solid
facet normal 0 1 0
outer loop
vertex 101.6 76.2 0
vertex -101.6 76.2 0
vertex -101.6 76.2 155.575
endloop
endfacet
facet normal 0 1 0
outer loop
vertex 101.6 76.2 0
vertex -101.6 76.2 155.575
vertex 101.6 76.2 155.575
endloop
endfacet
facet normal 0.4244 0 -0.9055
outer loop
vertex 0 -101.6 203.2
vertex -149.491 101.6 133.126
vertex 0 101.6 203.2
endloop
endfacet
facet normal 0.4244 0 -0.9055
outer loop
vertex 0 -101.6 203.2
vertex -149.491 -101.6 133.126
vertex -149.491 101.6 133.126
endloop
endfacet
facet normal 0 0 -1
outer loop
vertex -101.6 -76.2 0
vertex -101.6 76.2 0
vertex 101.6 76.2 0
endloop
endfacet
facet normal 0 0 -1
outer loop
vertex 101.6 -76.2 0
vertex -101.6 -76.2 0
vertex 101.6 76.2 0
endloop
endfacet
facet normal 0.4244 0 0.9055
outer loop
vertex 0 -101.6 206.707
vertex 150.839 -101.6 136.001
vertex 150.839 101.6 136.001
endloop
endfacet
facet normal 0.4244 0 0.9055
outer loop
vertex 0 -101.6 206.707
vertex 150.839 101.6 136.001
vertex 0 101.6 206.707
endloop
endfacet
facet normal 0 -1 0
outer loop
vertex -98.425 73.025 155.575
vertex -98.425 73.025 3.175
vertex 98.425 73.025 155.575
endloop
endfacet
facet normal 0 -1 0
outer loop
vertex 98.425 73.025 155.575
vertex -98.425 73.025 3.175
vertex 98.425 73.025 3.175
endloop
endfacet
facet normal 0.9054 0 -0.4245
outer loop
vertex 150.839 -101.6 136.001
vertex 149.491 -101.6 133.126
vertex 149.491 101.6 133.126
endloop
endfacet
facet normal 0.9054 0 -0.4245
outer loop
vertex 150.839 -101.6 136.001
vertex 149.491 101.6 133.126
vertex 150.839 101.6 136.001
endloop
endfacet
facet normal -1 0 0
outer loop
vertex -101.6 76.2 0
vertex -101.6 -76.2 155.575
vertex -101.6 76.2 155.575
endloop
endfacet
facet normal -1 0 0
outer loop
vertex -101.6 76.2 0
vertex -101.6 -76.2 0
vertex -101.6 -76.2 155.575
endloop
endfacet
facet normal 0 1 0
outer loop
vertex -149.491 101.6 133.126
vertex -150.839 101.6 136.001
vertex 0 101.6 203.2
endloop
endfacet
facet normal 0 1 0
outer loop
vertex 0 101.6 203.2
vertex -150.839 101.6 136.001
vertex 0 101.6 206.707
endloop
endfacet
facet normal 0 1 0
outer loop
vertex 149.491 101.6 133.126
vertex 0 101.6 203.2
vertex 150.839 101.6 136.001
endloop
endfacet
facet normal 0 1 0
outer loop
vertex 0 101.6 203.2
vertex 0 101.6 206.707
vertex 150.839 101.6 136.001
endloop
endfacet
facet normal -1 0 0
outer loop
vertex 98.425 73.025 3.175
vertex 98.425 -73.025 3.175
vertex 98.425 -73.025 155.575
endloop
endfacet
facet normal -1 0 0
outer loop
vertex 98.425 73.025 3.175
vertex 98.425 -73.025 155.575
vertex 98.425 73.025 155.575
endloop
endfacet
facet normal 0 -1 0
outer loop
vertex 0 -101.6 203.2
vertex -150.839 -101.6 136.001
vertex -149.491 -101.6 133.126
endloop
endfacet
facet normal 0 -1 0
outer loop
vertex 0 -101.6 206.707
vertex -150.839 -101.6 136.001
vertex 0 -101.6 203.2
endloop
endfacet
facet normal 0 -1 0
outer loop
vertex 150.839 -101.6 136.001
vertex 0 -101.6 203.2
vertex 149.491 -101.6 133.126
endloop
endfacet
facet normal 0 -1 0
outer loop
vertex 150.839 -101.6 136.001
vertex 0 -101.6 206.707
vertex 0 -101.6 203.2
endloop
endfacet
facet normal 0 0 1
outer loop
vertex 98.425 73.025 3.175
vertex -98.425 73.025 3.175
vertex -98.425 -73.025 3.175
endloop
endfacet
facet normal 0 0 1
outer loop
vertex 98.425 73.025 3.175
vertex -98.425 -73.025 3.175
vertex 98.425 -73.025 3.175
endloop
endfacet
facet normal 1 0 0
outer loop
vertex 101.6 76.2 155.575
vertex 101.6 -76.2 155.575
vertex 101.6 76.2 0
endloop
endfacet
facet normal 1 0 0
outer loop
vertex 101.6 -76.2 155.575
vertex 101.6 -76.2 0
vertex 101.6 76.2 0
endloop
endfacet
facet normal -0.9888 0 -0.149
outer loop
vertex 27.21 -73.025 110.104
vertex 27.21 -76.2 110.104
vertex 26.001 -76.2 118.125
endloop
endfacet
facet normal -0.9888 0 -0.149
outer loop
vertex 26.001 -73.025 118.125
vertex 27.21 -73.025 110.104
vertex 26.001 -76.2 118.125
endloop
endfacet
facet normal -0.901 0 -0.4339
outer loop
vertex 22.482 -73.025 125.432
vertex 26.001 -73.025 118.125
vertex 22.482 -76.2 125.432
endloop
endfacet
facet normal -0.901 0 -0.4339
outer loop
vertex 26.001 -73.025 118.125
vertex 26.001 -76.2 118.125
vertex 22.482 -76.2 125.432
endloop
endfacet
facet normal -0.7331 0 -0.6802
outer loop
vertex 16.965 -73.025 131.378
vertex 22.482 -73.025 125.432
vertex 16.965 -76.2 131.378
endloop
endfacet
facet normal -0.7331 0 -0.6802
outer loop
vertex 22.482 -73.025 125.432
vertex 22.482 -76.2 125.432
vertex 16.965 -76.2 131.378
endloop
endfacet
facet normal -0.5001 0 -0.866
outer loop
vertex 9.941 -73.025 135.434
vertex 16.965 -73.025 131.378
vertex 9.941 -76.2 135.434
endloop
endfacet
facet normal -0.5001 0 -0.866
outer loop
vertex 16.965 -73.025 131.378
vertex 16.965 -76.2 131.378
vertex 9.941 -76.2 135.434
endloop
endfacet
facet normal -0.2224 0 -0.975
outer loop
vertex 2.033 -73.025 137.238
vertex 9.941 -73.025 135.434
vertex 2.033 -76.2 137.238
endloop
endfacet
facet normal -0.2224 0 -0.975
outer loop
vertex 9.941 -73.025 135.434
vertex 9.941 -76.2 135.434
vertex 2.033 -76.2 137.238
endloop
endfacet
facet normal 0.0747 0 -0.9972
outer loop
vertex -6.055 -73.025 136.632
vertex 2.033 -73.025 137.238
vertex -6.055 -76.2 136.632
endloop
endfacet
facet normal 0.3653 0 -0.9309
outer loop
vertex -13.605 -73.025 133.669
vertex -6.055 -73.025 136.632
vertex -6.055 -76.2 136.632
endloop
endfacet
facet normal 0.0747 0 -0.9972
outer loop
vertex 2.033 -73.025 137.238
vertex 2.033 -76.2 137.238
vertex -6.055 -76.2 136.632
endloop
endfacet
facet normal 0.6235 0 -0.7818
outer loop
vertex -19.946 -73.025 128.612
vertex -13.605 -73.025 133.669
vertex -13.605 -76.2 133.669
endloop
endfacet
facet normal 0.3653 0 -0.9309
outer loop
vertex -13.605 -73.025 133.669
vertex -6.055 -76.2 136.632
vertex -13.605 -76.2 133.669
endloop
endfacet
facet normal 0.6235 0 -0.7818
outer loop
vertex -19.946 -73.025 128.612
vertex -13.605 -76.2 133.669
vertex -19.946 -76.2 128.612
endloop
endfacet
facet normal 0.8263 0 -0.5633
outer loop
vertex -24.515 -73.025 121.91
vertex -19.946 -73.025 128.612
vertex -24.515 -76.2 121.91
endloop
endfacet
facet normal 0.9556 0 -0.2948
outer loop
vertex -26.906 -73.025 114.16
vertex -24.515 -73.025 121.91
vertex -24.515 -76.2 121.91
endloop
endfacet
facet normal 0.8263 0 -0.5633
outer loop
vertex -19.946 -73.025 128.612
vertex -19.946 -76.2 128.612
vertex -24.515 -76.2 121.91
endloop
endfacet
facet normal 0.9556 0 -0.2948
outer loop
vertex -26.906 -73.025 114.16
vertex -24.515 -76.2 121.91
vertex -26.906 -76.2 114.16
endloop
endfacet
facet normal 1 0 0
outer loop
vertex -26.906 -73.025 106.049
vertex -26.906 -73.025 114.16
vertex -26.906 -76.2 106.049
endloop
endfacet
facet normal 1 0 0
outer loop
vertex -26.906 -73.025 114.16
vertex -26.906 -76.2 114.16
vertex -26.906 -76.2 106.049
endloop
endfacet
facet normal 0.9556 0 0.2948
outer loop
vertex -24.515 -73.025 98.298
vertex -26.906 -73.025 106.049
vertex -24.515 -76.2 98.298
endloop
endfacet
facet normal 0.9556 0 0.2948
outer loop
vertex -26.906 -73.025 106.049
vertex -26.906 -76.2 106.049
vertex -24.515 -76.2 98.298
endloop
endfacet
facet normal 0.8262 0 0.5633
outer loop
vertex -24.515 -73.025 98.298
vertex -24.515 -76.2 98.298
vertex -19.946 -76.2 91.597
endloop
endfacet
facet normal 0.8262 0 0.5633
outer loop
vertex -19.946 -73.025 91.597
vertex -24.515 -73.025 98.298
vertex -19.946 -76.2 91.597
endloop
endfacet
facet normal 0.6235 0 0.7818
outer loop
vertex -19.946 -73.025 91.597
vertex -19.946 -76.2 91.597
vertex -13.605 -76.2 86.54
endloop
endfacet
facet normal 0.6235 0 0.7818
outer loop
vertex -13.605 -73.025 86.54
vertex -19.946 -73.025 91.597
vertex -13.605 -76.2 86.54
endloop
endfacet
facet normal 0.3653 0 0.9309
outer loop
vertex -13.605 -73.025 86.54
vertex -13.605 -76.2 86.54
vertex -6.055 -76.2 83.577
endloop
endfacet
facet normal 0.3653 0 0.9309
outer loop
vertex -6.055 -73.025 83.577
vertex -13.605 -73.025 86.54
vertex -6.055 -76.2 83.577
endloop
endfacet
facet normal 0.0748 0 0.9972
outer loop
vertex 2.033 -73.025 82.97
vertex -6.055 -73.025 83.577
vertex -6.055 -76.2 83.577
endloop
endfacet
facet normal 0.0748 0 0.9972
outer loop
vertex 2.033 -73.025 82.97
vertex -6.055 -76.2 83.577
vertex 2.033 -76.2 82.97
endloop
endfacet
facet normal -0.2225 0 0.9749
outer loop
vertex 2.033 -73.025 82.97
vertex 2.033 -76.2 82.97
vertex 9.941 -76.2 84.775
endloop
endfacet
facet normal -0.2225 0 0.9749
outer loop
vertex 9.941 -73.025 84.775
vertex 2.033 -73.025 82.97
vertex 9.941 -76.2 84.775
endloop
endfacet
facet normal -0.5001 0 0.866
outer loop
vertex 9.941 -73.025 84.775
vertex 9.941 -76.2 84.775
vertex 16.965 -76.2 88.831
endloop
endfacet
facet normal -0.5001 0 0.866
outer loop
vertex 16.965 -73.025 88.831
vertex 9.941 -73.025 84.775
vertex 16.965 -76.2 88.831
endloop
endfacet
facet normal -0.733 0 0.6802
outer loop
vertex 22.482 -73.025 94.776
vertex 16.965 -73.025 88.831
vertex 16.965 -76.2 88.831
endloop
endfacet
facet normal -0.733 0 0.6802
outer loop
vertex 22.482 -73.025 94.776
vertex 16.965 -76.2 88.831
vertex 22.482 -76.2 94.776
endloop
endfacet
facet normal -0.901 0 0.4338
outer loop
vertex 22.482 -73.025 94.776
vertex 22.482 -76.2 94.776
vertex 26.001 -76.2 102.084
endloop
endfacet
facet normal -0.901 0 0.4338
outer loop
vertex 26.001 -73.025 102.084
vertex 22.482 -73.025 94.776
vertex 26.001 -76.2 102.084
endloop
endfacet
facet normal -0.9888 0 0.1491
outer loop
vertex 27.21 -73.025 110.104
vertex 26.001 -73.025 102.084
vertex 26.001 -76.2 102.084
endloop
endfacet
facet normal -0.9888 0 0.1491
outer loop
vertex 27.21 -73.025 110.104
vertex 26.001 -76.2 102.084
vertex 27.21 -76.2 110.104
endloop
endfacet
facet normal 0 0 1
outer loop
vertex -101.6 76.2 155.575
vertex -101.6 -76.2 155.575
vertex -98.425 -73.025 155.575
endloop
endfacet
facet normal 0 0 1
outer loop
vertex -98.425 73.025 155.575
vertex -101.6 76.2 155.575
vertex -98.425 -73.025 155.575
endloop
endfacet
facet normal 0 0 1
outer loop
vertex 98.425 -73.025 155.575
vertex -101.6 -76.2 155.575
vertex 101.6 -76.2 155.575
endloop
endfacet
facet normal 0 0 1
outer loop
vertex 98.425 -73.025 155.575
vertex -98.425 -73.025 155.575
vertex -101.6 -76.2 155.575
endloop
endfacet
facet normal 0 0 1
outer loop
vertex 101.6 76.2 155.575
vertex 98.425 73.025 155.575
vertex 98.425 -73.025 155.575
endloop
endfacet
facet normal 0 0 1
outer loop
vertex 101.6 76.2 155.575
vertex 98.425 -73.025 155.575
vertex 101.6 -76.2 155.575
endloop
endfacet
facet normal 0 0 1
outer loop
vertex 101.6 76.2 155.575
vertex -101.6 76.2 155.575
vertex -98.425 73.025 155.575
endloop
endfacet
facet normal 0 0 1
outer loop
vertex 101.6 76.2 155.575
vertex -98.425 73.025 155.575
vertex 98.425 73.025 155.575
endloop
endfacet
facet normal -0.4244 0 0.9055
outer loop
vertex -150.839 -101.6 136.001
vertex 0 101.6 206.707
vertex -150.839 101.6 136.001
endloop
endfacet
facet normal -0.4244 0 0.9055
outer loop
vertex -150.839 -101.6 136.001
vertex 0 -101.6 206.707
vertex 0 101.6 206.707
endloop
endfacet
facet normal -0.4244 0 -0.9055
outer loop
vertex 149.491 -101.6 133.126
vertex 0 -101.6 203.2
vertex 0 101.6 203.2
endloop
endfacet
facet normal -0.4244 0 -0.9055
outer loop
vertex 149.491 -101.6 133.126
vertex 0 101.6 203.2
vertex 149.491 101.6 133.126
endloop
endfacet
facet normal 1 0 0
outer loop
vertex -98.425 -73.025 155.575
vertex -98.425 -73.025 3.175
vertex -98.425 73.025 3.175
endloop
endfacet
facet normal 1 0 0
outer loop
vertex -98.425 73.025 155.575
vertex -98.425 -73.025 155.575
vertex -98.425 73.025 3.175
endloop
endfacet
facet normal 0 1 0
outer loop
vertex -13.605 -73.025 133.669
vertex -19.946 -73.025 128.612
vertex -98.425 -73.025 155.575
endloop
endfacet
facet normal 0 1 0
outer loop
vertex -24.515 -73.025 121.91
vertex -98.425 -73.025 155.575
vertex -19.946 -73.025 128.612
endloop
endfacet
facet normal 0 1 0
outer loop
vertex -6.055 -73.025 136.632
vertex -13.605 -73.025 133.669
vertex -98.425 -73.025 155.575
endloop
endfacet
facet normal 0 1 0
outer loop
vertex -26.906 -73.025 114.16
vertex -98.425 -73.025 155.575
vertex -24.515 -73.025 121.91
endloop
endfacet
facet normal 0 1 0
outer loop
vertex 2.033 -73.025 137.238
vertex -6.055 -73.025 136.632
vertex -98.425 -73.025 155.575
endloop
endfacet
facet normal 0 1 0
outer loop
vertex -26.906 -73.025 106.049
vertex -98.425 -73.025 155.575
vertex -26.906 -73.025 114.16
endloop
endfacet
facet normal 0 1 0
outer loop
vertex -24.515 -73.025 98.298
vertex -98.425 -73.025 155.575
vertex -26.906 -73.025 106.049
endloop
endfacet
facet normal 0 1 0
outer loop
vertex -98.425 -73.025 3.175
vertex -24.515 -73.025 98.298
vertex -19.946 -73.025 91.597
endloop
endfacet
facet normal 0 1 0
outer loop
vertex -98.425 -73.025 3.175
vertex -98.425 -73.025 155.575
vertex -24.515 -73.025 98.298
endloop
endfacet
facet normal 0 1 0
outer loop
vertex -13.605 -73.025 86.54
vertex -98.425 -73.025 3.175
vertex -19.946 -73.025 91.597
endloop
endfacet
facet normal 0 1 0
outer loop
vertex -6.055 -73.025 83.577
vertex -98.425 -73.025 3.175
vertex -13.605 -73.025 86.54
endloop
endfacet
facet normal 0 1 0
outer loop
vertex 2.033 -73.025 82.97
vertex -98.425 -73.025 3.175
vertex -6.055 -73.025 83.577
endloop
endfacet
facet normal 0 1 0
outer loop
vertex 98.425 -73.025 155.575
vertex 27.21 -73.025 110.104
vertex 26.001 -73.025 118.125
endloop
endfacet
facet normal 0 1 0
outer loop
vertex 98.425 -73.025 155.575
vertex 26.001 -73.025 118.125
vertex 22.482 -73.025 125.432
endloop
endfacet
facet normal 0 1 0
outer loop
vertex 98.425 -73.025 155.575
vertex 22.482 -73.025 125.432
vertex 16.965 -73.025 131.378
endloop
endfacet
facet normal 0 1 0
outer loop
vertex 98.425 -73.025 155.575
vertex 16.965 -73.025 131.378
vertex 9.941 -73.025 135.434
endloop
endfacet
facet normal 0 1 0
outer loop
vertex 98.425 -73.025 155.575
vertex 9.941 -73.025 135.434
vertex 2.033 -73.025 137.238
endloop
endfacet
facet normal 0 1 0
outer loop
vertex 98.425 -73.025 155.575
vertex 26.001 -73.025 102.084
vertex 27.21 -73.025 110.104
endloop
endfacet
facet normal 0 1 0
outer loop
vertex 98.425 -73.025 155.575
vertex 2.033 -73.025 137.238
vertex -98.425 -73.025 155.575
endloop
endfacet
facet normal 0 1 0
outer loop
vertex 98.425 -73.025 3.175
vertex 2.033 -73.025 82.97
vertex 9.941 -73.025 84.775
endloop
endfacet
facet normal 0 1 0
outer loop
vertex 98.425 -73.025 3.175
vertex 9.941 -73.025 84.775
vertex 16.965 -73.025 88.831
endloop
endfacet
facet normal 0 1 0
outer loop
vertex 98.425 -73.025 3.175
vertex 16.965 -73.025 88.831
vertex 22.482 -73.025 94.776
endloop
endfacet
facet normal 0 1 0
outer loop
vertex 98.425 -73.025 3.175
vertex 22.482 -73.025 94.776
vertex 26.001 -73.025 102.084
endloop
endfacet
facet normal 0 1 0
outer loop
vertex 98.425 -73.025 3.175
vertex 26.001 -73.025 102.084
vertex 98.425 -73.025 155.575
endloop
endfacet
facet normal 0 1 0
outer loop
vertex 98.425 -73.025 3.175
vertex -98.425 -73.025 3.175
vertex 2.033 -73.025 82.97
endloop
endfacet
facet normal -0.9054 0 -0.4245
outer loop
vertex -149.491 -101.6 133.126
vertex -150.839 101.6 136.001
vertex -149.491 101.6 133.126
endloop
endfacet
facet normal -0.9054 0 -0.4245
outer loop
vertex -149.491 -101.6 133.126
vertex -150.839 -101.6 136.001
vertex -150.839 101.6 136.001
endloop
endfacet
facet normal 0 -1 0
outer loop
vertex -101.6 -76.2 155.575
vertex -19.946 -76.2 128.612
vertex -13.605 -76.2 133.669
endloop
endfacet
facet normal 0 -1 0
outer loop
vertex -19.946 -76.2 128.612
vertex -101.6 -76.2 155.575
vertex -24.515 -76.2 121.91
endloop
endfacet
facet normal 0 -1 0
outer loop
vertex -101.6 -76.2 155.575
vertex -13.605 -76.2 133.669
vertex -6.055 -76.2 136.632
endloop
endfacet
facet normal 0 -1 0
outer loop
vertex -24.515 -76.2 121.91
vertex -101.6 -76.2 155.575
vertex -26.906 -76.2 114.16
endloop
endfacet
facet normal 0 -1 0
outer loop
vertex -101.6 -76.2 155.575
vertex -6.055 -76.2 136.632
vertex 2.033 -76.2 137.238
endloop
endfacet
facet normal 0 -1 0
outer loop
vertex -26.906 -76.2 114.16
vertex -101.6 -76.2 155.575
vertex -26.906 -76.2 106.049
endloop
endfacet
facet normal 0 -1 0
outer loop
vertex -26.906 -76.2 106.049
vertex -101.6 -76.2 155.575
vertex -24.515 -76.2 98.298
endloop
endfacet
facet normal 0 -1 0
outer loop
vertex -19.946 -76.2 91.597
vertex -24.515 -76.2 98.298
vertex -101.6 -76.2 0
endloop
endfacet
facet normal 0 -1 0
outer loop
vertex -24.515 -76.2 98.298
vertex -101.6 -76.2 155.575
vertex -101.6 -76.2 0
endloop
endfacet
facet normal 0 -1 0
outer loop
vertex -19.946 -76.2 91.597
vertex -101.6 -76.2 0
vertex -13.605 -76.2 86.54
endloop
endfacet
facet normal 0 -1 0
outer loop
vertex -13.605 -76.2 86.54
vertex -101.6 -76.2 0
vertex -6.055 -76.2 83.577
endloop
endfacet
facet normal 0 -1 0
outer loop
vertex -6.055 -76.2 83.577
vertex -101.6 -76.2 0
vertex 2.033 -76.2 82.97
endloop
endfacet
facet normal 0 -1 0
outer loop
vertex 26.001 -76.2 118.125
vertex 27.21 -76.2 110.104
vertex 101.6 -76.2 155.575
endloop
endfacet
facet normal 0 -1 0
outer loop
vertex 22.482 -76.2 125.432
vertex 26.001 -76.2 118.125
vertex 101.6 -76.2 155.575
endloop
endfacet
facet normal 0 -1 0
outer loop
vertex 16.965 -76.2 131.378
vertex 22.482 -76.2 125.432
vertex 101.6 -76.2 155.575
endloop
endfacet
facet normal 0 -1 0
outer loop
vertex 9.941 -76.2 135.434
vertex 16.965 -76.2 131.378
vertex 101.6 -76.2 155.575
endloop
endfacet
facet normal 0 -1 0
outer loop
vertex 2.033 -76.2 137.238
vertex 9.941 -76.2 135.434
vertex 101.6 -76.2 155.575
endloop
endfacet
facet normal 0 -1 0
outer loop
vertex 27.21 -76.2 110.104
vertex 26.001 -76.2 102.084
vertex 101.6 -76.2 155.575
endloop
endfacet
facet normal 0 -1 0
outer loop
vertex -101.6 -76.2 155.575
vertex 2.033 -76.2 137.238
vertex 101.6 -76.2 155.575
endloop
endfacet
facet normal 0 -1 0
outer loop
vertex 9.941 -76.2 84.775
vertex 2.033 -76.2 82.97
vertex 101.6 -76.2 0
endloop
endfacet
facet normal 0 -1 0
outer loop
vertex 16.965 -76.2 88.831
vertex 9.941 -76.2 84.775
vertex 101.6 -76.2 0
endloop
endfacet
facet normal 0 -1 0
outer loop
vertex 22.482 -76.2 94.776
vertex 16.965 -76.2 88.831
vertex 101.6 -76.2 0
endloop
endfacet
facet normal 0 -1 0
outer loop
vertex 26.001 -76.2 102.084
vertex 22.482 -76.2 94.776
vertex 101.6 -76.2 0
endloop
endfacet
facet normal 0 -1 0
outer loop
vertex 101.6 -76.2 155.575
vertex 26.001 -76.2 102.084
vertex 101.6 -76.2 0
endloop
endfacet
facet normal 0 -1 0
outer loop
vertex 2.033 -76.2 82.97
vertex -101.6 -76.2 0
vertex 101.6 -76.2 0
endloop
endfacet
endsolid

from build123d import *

# Parameters (mm, degrees)
F0_W     = 203.2
F0_H     = 152.4
F1_DEPTH = 3.175
F2_W     = 203.2
F2_H     = 152.4
F2_W_2   = 196.85
F2_H_2   = 146.05
F3_DEPTH = 152.4
F5_DEPTH = 101.6
F6_R     = 27.210092
F7_DEPTH = 25.4


with BuildPart() as f1:
    # F0 (on Top) → F1 (new body)
    with BuildSketch(Plane.XY):
        Rectangle(F0_W, F0_H)
    extrude(amount=F1_DEPTH)

    # F2 (on face) → F3 (join)
    with BuildSketch(Plane.XY.offset(3.175)):
        Rectangle(F2_W, F2_H)
        Rectangle(F2_W_2, F2_H_2, mode=Mode.SUBTRACT)
    extrude(amount=F3_DEPTH)

    # F6 (on face) → F7 (cut)
    with BuildSketch(Plane.XZ.offset(76.2)):
        with Locations((0, 110.104419)):
            Circle(F6_R)
    extrude(amount=-F7_DEPTH, mode=Mode.SUBTRACT)


with BuildPart() as f5:
    # F4 (on Front) → F5 (new body, symmetric)
    with BuildSketch(Plane.XZ):
        Polygon((-149.49127, 133.125967), (0, 203.2), (149.49127, 133.125967), (150.838848, 136.000799), (0, 206.706509), (-150.838848, 136.000799), align=None)
    extrude(amount=F5_DEPTH, both=True)


solid = Compound([f1.part, f5.part])
